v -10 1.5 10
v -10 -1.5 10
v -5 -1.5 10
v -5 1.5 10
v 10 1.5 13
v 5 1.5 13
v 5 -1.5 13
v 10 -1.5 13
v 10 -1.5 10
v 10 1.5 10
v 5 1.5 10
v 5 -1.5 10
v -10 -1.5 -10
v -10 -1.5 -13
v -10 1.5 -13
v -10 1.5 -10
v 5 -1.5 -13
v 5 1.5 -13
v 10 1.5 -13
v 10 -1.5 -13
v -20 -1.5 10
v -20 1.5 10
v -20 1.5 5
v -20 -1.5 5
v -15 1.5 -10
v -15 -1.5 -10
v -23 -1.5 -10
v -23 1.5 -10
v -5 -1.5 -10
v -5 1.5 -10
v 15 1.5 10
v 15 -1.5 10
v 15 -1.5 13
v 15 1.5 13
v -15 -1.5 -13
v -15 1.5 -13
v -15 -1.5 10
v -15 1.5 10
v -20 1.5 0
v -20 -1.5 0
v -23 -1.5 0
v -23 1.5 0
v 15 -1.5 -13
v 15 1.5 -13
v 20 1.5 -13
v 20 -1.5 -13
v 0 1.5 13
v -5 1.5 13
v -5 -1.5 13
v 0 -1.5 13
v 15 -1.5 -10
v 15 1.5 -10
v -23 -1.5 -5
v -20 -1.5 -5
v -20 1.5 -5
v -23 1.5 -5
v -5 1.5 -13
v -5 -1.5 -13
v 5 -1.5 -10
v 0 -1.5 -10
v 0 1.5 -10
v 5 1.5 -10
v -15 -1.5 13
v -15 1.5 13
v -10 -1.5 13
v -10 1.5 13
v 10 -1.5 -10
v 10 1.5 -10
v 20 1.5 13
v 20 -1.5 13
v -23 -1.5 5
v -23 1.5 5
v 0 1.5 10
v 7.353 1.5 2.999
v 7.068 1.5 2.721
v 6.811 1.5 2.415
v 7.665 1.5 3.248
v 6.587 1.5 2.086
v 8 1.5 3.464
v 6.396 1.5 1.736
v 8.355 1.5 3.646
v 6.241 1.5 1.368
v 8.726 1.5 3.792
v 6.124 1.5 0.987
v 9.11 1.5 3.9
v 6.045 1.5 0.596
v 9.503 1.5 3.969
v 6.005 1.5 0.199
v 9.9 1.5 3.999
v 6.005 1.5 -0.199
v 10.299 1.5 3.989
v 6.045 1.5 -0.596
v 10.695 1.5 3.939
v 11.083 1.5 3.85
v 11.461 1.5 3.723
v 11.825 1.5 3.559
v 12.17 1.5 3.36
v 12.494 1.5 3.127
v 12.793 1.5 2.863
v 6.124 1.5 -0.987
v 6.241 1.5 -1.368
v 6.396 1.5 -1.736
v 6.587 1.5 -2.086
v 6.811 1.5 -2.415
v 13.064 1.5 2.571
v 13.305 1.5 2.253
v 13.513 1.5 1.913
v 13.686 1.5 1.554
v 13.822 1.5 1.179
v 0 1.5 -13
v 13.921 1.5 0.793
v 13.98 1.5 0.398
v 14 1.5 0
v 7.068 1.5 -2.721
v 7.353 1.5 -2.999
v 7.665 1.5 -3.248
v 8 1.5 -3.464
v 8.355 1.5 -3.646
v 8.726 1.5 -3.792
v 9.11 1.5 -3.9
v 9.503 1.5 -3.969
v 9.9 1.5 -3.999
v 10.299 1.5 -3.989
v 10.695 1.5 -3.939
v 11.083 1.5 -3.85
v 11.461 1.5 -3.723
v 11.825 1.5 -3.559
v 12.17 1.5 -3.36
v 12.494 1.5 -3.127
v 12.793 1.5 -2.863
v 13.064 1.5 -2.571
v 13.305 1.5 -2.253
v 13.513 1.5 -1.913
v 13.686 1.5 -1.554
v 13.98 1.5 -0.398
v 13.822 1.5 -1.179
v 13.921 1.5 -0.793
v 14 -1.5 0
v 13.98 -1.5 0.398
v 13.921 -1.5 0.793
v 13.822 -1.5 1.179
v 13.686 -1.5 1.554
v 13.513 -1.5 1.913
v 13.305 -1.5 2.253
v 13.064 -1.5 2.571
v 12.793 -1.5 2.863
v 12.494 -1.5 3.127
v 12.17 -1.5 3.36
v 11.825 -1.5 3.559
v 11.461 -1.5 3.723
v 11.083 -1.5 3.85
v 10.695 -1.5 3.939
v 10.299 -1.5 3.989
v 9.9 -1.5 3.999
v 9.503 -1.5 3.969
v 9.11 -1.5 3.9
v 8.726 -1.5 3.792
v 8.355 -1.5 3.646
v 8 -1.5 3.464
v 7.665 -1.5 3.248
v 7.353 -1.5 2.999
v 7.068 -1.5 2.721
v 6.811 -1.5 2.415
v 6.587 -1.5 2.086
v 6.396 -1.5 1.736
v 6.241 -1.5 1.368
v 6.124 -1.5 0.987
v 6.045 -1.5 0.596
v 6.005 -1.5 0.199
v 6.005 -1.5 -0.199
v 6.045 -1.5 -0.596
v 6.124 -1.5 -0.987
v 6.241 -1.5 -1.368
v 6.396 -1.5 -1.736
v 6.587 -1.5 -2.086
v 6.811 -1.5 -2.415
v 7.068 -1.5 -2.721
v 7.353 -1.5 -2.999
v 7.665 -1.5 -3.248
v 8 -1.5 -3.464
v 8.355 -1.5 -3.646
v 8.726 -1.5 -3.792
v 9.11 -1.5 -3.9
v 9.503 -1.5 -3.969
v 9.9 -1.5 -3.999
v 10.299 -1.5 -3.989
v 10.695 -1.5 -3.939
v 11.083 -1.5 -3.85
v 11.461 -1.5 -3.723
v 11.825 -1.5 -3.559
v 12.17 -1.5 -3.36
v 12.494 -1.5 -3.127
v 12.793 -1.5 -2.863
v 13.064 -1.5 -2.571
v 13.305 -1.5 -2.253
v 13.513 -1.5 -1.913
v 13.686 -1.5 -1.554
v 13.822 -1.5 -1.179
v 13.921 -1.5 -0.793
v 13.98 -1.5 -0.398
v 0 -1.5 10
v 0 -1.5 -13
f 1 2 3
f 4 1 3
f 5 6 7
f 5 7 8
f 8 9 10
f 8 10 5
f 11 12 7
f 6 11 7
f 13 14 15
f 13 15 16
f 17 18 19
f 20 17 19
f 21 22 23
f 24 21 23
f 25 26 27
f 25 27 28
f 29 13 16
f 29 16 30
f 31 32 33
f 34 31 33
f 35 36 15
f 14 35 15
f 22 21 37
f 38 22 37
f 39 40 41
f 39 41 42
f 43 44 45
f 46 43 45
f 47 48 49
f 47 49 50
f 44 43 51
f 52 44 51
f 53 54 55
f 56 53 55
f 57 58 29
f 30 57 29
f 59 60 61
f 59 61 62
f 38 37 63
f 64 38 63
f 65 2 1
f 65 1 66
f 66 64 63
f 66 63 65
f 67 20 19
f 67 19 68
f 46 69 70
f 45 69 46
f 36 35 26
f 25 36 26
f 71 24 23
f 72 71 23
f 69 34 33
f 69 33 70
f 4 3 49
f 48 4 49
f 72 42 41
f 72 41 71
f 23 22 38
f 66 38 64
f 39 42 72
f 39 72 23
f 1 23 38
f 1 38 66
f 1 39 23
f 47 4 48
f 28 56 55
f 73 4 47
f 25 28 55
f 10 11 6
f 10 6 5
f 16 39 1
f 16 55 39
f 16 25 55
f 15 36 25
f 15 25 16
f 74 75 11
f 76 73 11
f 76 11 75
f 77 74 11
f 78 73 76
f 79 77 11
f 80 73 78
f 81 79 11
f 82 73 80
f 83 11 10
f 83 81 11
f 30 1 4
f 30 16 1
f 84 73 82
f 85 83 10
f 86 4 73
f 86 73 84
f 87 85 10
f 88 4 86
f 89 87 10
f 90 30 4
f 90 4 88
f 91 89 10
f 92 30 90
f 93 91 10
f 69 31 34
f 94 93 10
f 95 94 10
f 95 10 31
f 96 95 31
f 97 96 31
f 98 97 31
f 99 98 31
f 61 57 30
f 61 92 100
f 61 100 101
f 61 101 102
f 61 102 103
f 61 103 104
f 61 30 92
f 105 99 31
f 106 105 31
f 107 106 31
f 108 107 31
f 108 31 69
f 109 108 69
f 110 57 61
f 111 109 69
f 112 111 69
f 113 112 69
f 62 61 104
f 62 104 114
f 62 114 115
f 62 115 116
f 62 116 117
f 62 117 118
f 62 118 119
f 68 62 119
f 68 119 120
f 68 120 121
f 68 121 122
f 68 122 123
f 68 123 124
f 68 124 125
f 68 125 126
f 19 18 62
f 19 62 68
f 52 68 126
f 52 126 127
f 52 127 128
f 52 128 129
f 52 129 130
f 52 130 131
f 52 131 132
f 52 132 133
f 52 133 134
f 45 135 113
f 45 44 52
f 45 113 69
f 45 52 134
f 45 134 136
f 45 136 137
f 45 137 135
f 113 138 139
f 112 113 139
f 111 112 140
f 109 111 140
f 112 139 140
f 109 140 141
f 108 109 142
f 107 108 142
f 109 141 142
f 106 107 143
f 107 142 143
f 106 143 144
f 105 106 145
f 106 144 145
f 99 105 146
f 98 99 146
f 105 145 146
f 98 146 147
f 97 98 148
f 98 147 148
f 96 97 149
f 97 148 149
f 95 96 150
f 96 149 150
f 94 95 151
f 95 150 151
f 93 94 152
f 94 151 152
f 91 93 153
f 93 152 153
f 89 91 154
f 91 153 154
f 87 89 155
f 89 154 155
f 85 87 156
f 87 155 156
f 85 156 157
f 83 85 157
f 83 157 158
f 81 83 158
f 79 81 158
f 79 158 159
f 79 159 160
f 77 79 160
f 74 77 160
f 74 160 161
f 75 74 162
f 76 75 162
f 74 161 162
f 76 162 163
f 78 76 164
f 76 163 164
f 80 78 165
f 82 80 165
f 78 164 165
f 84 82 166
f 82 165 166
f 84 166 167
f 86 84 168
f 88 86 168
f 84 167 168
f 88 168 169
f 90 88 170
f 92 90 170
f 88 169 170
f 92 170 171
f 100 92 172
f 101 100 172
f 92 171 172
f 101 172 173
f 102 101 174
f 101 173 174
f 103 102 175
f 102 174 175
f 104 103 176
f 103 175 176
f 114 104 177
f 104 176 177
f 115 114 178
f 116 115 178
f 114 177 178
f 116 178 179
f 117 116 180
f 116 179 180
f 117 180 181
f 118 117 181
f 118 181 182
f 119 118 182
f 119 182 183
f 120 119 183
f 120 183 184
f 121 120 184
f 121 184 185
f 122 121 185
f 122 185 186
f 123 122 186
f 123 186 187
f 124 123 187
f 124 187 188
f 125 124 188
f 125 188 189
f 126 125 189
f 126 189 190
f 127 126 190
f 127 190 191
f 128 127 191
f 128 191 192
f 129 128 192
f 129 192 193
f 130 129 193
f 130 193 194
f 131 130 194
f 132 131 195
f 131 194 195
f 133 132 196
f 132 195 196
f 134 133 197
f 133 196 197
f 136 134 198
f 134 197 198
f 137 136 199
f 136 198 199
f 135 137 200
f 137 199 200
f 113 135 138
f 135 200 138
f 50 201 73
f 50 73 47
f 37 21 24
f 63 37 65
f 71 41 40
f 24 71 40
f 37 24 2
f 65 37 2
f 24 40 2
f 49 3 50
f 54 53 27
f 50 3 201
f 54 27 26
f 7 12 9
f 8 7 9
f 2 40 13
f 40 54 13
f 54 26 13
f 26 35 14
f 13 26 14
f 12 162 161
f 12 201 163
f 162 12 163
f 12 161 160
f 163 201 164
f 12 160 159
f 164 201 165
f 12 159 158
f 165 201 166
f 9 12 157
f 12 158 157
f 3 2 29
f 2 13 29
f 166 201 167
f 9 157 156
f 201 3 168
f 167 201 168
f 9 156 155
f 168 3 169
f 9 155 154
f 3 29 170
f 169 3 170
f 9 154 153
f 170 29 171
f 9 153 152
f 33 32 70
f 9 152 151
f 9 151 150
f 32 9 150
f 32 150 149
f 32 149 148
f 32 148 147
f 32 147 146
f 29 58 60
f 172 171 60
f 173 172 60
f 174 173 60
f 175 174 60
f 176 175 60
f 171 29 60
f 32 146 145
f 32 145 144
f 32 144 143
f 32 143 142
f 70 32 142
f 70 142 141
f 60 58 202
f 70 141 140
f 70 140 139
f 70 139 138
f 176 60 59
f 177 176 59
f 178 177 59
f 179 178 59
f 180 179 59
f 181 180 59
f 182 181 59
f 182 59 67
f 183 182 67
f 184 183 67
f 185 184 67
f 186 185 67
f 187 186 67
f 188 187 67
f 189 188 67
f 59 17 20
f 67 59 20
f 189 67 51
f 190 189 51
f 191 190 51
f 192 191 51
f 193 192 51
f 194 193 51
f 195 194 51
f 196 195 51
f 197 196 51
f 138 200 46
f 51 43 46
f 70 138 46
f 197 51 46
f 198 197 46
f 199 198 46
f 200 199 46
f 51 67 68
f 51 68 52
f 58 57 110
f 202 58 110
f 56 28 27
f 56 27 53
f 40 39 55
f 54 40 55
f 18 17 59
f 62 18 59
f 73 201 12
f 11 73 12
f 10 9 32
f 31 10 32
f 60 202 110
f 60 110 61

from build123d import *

# Parameters (mm, degrees)
SKETCH1_W           = 40
SKETCH1_H           = 26
BOSS_EXTRUDE1_DEPTH = 1.5
SKETCH2_R           = 4
CUT_EXTRUDE1_DEPTH  = 3
SKETCH8_W           = 5
SKETCH8_H           = 3
BOSS_EXTRUDE7_DEPTH = 3
SKETCH9_W           = 5
SKETCH9_H           = 3
CUT_EXTRUDE2_DEPTH  = 3


with BuildPart() as part:
    # Sketch1 → Boss-Extrude1 (new body, symmetric)
    with BuildSketch(Plane(origin=(0, 0, 0), x_dir=(1, 0, 0), z_dir=(0, 1, 0))):
        Rectangle(SKETCH1_W, SKETCH1_H)
    extrude(amount=BOSS_EXTRUDE1_DEPTH, both=True)

    # Sketch2 → Cut-Extrude1 (cut)
    with BuildSketch(Plane.XZ.offset(1.5)):
        with Locations((10, 0)):
            Circle(SKETCH2_R)
    extrude(amount=-CUT_EXTRUDE1_DEPTH, mode=Mode.SUBTRACT)

    # Sketch8 → Boss-Extrude7 (add)
    with BuildSketch(Plane.ZY.offset(20)):
        with Locations((-7.5, 0)):
            Rectangle(SKETCH8_W, SKETCH8_H)
        with Locations((2.5, 0)):
            Rectangle(SKETCH8_W, SKETCH8_H)
    extrude(amount=BOSS_EXTRUDE7_DEPTH)

    # Sketch9 → Cut-Extrude2 (cut)
    with BuildSketch(Plane.XZ.offset(1.5)):
        with Locations((-17.5, -11.5)):
            Rectangle(SKETCH9_W, SKETCH9_H)
        with Locations((-7.5, -11.5)):
            Rectangle(SKETCH9_W, SKETCH9_H)
        with Locations((-17.5, 11.5)):
            Rectangle(SKETCH9_W, SKETCH9_H)
        with Locations((-7.5, 11.5)):
            Rectangle(SKETCH9_W, SKETCH9_H)
        with Locations((2.5, 11.5)):
            Rectangle(SKETCH9_W, SKETCH9_H)
        with Locations((12.5, 11.5)):
            Rectangle(SKETCH9_W, SKETCH9_H)
        with Locations((2.5, -11.5)):
            Rectangle(SKETCH9_W, SKETCH9_H)
        with Locations((12.5, -11.5)):
            Rectangle(SKETCH9_W, SKETCH9_H)
    extrude(amount=-CUT_EXTRUDE2_DEPTH, mode=Mode.SUBTRACT)


solid = part.part
